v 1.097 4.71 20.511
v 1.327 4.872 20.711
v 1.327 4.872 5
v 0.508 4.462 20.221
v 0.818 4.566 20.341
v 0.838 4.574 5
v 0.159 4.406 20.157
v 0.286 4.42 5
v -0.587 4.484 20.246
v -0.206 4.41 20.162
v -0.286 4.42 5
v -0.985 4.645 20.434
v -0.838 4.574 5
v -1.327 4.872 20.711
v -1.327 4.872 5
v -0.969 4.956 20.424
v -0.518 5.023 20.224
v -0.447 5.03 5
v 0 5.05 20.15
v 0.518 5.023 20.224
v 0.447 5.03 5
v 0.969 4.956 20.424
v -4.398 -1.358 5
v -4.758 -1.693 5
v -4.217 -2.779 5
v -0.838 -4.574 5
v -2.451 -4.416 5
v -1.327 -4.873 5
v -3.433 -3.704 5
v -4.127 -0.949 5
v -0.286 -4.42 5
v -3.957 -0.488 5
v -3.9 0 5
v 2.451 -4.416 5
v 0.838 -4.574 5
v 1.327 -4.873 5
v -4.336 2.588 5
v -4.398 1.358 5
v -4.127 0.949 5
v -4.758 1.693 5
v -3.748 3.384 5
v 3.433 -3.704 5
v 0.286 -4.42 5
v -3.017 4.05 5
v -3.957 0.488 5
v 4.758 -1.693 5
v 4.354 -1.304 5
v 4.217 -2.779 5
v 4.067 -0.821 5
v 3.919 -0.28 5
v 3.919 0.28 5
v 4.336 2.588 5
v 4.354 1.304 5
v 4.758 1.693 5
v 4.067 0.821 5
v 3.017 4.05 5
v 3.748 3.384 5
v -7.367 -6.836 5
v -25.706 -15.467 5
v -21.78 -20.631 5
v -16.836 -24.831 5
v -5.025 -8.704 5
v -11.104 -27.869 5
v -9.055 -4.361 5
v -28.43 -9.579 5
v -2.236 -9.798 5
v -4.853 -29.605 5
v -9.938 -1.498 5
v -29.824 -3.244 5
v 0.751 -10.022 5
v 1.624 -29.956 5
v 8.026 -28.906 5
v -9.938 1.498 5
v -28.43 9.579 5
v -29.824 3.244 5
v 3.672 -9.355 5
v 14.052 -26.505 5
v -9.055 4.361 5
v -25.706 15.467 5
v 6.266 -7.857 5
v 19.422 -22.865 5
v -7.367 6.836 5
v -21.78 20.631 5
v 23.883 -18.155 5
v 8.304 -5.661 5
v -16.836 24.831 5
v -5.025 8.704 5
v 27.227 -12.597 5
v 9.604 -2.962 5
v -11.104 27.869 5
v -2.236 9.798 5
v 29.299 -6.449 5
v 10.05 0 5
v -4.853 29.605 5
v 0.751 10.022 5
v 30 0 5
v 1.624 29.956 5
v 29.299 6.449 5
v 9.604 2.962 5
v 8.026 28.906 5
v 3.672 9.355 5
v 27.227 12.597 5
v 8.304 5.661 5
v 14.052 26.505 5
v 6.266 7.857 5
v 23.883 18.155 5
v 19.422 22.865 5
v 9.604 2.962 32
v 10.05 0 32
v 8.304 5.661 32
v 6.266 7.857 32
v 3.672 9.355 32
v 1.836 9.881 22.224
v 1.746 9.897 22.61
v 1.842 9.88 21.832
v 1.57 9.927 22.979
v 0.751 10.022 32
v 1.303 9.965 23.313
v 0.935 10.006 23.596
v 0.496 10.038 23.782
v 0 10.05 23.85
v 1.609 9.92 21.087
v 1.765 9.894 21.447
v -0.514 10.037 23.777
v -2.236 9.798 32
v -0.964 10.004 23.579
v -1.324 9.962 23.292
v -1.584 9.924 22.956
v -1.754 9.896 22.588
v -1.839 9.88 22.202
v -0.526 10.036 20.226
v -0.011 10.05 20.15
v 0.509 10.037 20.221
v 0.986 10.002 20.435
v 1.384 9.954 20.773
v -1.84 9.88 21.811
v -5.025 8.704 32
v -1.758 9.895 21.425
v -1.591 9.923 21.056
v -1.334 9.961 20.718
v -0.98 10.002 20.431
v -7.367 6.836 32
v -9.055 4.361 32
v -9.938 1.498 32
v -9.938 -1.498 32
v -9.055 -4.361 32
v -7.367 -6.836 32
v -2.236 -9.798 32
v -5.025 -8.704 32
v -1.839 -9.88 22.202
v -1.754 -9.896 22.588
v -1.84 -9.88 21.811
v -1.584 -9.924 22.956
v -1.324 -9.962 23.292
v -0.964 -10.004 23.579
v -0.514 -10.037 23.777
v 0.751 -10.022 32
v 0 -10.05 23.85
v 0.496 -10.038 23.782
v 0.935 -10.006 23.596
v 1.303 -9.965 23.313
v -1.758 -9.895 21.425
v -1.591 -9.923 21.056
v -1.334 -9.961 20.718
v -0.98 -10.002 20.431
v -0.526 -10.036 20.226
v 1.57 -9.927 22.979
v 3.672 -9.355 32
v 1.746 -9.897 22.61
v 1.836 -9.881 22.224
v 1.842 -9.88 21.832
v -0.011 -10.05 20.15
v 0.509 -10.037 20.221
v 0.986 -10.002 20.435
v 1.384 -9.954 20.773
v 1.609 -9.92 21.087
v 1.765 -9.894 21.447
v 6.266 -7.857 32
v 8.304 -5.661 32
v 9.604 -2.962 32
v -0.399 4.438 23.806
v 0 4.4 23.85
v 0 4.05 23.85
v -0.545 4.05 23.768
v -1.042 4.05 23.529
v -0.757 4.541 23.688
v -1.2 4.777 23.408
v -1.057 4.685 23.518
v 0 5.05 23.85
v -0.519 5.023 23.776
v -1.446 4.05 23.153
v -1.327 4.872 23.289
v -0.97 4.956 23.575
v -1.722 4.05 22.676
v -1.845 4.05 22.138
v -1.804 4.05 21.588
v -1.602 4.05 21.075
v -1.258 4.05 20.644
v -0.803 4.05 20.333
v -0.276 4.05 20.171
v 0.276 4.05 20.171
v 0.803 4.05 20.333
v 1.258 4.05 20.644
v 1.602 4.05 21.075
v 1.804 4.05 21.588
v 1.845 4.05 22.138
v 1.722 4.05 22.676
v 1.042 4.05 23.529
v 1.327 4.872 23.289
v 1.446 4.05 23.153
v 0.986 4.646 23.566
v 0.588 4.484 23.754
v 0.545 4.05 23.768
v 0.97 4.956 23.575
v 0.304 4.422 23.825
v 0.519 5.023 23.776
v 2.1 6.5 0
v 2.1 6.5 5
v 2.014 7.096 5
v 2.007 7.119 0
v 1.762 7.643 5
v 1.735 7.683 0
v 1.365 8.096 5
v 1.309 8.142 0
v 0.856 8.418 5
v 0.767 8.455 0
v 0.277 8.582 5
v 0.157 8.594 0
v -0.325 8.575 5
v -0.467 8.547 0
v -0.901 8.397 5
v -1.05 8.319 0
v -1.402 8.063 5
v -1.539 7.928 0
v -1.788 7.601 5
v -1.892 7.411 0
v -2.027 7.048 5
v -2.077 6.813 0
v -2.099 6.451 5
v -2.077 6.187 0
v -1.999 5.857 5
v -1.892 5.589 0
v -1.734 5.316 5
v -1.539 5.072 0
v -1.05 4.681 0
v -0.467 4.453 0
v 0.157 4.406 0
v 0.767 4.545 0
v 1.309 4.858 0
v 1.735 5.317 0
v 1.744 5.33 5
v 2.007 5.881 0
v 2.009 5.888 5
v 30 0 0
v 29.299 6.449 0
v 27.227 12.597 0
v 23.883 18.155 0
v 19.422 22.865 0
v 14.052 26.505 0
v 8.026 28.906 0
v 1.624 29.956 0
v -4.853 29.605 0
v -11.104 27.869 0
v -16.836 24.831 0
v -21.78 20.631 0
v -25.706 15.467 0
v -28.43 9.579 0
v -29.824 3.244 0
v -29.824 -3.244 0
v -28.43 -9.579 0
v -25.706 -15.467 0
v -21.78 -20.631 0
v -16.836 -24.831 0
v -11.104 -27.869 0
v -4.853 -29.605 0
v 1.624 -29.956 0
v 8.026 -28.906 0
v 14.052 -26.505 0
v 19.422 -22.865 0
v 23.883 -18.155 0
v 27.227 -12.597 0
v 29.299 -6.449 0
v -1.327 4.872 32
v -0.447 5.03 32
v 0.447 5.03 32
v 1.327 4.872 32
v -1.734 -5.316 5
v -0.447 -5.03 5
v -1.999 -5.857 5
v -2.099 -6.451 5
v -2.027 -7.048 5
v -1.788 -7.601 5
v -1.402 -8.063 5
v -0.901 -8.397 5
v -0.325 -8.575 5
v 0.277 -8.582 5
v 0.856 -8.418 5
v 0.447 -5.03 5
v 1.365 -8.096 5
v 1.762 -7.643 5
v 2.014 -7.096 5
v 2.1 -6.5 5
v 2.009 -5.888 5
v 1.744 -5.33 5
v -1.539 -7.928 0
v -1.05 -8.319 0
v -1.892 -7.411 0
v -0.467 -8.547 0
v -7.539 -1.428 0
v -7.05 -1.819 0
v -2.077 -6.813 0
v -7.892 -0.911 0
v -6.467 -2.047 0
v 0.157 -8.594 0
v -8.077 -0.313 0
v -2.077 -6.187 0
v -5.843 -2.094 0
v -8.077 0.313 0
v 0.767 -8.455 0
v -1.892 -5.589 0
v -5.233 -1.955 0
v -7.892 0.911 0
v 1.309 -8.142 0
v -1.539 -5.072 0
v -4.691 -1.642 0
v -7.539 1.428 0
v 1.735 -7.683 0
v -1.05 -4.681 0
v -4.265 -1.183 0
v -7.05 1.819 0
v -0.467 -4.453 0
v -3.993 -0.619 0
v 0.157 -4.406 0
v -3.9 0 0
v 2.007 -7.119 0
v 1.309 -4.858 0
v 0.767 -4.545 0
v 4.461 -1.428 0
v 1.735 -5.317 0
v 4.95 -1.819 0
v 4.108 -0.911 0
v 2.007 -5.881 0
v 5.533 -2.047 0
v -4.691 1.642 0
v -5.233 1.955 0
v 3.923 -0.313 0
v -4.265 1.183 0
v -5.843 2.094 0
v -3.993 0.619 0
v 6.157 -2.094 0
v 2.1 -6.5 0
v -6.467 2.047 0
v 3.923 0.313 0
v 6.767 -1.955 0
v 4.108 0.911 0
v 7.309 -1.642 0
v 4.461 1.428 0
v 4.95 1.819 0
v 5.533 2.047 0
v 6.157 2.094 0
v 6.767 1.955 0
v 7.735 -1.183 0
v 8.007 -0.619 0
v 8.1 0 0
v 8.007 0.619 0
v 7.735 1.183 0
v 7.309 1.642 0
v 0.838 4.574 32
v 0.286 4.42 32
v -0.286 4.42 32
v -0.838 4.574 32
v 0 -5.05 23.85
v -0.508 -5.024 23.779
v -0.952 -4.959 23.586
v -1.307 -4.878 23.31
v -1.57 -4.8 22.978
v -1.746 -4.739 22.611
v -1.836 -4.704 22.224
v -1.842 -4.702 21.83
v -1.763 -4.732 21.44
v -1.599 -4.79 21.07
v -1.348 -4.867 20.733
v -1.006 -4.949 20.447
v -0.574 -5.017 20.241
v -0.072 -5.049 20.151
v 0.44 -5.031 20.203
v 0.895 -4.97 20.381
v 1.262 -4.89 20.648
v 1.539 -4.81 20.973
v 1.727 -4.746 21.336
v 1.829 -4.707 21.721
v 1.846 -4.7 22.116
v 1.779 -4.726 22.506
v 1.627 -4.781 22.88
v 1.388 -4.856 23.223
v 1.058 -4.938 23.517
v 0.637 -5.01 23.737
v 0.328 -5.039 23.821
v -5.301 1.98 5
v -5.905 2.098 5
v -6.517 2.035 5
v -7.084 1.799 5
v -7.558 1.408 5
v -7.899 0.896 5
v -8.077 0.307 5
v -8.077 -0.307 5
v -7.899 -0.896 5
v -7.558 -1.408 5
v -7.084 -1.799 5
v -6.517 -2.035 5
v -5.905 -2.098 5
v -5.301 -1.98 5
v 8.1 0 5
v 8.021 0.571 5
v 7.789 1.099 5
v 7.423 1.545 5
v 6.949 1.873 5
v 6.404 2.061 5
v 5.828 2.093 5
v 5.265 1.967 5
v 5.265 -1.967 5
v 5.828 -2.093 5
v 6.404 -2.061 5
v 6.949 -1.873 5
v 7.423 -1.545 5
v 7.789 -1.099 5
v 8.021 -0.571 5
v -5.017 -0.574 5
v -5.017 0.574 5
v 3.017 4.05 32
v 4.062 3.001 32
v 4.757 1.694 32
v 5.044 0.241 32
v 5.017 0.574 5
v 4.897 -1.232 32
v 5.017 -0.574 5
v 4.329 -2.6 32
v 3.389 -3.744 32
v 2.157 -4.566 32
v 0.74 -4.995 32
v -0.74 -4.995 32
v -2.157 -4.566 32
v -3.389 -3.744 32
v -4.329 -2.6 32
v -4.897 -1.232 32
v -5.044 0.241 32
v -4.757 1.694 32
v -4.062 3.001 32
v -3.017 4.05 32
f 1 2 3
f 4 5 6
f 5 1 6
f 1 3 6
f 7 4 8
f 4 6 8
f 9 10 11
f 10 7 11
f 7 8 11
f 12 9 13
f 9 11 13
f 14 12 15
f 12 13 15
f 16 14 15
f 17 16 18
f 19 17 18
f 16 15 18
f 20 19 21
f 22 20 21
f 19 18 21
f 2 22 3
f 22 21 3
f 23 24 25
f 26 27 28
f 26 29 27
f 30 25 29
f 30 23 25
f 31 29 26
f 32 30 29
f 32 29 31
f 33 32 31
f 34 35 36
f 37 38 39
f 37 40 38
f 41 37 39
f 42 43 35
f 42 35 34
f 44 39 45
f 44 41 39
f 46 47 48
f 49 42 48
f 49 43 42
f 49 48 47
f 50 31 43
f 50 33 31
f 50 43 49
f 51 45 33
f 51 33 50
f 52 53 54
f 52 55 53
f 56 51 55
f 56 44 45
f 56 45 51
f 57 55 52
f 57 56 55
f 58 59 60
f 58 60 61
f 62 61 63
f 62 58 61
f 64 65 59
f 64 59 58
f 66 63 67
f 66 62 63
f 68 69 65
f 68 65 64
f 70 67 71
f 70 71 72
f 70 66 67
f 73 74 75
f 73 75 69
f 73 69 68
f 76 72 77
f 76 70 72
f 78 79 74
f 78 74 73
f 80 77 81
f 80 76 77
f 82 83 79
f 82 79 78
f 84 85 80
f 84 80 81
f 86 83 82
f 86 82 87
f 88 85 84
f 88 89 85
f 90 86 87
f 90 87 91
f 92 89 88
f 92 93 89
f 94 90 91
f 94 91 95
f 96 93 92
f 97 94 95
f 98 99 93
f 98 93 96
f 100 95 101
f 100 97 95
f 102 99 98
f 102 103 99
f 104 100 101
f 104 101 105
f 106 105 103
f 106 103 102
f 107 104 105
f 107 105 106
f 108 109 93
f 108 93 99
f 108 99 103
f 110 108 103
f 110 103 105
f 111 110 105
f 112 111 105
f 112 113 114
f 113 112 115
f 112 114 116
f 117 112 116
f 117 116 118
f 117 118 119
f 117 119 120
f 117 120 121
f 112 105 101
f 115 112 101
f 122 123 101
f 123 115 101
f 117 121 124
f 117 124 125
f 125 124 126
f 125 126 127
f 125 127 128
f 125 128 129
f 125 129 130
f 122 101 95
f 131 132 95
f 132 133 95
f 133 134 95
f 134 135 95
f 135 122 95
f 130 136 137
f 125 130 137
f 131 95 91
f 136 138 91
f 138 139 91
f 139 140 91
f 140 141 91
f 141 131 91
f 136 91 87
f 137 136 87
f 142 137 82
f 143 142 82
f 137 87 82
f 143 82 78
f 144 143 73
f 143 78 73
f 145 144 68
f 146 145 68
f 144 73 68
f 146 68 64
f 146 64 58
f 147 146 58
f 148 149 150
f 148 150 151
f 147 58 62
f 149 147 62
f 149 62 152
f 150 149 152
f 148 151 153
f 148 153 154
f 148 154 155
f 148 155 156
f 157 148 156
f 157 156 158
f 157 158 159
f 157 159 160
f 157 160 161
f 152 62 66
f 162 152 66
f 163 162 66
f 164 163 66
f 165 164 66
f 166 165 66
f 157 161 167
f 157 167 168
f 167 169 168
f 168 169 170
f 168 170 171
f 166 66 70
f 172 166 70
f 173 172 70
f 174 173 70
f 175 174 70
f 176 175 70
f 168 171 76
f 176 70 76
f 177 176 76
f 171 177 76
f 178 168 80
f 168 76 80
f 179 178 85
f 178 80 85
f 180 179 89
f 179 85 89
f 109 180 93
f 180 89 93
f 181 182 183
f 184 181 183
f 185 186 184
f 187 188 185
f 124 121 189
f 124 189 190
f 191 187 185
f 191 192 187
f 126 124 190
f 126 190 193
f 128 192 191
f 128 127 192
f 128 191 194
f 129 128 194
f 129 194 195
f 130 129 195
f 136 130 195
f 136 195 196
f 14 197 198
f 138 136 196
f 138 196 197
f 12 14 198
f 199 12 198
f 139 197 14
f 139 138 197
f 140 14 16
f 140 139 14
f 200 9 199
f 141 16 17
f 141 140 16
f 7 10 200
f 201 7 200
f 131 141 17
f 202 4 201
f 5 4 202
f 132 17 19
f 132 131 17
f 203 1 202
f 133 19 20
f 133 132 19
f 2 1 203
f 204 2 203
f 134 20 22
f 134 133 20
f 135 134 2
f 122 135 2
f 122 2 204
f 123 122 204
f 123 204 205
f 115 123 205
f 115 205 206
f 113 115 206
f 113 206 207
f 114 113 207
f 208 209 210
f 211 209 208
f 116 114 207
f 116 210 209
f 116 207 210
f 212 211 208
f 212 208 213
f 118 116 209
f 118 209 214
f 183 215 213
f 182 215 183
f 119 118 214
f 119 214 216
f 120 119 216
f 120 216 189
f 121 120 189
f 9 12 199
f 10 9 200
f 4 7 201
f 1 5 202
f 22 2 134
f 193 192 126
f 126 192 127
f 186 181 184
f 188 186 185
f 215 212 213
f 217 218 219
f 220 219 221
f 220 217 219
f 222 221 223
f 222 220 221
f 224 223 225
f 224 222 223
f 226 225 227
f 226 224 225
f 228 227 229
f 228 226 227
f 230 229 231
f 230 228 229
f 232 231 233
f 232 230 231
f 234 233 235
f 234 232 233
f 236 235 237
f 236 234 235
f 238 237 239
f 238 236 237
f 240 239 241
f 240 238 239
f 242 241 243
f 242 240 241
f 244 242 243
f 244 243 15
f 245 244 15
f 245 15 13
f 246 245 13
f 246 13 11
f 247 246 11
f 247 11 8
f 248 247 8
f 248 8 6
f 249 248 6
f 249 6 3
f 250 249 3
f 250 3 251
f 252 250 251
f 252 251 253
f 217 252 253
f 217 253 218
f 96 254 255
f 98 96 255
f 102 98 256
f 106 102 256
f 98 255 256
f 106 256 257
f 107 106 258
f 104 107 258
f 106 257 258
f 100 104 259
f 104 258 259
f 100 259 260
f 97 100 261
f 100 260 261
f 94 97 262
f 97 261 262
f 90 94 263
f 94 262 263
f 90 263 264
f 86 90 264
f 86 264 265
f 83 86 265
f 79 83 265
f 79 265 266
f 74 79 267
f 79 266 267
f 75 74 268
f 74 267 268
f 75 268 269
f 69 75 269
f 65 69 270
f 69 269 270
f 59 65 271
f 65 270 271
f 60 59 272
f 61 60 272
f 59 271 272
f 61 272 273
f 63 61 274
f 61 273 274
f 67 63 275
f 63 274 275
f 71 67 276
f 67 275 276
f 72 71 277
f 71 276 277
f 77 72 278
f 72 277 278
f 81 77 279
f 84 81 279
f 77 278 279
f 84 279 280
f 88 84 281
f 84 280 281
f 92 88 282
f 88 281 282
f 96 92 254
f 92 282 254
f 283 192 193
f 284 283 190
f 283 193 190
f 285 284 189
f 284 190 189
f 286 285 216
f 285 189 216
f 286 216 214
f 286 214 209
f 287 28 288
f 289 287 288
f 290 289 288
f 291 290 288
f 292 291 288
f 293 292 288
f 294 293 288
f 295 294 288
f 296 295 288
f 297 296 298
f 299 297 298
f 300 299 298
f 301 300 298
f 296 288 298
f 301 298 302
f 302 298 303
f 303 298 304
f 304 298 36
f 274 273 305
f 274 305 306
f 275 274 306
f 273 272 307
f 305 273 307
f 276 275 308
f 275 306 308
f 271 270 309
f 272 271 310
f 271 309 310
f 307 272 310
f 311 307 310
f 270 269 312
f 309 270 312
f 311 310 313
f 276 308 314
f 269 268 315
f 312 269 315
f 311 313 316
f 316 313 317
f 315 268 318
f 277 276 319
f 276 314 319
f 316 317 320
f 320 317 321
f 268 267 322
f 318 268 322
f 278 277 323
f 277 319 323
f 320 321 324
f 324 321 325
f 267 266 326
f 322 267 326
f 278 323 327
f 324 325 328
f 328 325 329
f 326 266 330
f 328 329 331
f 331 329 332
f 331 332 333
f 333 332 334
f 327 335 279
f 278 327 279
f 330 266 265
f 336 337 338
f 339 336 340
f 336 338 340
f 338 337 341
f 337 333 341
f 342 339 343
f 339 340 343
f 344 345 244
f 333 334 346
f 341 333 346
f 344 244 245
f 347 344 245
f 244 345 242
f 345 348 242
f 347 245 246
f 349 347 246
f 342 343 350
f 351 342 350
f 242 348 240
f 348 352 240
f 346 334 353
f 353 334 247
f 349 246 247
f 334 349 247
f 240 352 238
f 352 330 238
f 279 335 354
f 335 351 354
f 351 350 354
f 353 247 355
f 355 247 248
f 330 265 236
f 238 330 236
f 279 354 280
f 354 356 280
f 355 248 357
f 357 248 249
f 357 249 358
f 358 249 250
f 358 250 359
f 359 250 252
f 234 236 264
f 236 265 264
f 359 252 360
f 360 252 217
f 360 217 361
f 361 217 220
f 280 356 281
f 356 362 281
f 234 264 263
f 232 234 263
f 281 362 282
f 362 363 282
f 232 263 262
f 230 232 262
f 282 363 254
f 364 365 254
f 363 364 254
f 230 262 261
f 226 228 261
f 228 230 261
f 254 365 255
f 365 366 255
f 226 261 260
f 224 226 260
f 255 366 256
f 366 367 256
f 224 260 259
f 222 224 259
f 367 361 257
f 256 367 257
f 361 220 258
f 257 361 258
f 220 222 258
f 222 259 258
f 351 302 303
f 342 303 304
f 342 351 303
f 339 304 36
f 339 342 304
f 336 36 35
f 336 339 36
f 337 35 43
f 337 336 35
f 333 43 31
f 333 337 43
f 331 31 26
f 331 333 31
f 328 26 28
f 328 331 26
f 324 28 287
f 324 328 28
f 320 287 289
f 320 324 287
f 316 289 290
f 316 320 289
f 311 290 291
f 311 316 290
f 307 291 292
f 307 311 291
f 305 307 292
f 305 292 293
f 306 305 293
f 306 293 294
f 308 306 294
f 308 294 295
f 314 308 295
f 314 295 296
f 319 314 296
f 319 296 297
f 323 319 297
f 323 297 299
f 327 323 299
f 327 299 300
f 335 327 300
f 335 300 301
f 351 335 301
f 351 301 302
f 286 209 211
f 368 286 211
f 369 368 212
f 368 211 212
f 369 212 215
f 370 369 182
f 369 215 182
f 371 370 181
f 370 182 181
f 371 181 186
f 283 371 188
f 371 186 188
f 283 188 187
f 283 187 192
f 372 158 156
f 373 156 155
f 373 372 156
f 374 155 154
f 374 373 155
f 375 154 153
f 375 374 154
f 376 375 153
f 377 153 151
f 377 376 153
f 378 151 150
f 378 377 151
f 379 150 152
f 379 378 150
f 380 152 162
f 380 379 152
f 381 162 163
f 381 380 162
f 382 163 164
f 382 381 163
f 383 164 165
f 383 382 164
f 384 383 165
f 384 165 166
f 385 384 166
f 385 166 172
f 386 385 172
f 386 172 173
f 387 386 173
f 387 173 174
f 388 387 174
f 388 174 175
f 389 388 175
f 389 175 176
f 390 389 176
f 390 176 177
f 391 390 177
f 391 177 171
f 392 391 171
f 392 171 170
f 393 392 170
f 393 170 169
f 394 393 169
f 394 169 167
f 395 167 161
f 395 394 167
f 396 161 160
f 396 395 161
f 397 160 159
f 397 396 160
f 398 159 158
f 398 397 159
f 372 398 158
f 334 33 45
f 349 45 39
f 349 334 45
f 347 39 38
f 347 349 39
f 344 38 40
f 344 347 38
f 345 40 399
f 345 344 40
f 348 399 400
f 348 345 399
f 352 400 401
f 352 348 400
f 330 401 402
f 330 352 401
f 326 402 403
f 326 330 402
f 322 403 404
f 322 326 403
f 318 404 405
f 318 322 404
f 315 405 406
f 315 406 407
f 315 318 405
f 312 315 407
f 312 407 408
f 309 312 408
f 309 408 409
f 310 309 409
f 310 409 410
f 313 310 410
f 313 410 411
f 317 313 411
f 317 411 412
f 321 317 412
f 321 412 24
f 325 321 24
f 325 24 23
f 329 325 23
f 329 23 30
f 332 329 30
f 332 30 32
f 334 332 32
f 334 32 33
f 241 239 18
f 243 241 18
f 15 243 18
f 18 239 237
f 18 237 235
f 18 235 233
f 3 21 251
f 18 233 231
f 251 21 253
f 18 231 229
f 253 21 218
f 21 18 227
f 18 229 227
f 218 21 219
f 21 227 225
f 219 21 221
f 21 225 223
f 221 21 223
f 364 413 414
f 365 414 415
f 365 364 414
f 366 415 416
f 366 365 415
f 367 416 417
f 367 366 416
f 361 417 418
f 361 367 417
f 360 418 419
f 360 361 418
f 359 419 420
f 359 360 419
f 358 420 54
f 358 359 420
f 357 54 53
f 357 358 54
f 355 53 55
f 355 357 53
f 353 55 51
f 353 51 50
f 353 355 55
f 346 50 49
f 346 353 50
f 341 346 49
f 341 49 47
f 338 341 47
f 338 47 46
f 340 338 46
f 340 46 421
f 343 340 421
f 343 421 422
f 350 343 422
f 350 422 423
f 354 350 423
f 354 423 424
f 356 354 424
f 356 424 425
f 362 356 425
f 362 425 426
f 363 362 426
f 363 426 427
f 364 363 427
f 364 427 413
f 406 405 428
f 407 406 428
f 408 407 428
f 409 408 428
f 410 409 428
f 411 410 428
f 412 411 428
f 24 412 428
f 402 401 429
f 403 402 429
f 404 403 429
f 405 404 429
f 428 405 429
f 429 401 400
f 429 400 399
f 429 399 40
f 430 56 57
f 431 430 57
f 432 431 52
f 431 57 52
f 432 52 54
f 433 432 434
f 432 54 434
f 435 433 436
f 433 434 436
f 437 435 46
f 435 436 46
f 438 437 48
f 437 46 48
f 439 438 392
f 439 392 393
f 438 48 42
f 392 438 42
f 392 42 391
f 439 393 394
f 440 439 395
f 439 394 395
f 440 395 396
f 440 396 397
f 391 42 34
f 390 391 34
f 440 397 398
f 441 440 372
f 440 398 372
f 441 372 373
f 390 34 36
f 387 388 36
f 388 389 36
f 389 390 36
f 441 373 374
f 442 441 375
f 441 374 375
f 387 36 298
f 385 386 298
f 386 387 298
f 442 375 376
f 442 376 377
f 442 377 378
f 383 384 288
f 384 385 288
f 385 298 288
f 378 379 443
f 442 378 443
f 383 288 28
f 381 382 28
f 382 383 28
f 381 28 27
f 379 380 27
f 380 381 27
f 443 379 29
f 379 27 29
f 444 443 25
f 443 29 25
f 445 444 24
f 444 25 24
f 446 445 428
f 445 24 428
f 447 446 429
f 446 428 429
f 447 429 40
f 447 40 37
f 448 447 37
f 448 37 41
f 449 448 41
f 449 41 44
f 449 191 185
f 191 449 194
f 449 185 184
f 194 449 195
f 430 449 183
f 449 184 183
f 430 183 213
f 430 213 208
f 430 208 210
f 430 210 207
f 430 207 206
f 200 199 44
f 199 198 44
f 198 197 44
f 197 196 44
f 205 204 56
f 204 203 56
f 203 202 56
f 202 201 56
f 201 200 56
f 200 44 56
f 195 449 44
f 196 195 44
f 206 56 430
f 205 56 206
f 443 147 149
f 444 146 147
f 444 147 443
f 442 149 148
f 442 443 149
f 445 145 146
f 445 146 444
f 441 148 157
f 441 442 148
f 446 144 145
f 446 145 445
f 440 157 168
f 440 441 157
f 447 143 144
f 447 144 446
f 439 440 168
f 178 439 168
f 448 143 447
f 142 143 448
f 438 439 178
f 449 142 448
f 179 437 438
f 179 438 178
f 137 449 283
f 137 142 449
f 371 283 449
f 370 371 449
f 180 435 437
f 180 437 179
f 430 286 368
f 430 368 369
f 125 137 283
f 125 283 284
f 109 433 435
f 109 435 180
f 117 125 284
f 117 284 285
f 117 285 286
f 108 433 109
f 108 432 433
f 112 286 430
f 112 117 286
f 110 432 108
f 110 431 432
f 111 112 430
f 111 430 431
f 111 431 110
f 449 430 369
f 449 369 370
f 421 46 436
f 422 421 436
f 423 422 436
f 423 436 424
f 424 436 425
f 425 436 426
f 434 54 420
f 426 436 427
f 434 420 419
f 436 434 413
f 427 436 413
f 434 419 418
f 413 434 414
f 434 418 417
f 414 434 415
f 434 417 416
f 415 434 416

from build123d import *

# Parameters (mm, degrees)
SKETCH1_R               = 30
SKETCH1_R_2             = 2.1
BOSS_EXTRUDE1_DEPTH     = 5
SKETCH2_R               = 10.05
BOSS_EXTRUDE2_DEPTH     = 27
CUT_EXTRUDE1_DEPTH      = 20
CUT_EXTRUDE1_DEPTH_BACK = 20
SKETCH3_R               = 1.85


with BuildPart() as part:
    # Sketch1 → Boss-Extrude1 (new body)
    with BuildSketch(Plane.XY):
        Circle(SKETCH1_R)
        with Locations((0, 6.5)):
            Circle(SKETCH1_R_2, mode=Mode.SUBTRACT)
        with Locations((6, 0)):
            Circle(SKETCH1_R_2, mode=Mode.SUBTRACT)
        with Locations((0, -6.5)):
            Circle(SKETCH1_R_2, mode=Mode.SUBTRACT)
        with Locations((-6, 0)):
            Circle(SKETCH1_R_2, mode=Mode.SUBTRACT)
    extrude(amount=BOSS_EXTRUDE1_DEPTH)

    # Sketch2 → Boss-Extrude2 (add)
    with BuildSketch(Plane.XY.offset(5)):
        Circle(SKETCH2_R)
        with BuildLine():
            ThreePointArc((1.327118589, 4.8725), (0, 4.4), (-1.327118589, 4.8725))
            ThreePointArc((-1.327118589, 4.8725), (0, 5.05), (1.327118589, 4.8725))
        make_face(mode=Mode.SUBTRACT)
        with BuildLine():
            ThreePointArc((3.016620626, 4.05), (0, -5.05), (-3.016620626, 4.05))
            Line((-3.016620626, 4.05), (3.016620626, 4.05))
        make_face(mode=Mode.SUBTRACT)
    extrude(amount=BOSS_EXTRUDE2_DEPTH)

    # Sketch3 → Cut-Extrude1 (cut, two sides: drawn at the far end of the back side and taken through both)
    with BuildSketch(Plane(origin=(0, 4.05, 0), x_dir=(-1, 0, 0), z_dir=(0, -1, 0)).offset(-CUT_EXTRUDE1_DEPTH_BACK)):
        with Locations((0, -22)):
            Circle(SKETCH3_R)
    extrude(amount=CUT_EXTRUDE1_DEPTH + CUT_EXTRUDE1_DEPTH_BACK, mode=Mode.SUBTRACT)


solid = part.part
